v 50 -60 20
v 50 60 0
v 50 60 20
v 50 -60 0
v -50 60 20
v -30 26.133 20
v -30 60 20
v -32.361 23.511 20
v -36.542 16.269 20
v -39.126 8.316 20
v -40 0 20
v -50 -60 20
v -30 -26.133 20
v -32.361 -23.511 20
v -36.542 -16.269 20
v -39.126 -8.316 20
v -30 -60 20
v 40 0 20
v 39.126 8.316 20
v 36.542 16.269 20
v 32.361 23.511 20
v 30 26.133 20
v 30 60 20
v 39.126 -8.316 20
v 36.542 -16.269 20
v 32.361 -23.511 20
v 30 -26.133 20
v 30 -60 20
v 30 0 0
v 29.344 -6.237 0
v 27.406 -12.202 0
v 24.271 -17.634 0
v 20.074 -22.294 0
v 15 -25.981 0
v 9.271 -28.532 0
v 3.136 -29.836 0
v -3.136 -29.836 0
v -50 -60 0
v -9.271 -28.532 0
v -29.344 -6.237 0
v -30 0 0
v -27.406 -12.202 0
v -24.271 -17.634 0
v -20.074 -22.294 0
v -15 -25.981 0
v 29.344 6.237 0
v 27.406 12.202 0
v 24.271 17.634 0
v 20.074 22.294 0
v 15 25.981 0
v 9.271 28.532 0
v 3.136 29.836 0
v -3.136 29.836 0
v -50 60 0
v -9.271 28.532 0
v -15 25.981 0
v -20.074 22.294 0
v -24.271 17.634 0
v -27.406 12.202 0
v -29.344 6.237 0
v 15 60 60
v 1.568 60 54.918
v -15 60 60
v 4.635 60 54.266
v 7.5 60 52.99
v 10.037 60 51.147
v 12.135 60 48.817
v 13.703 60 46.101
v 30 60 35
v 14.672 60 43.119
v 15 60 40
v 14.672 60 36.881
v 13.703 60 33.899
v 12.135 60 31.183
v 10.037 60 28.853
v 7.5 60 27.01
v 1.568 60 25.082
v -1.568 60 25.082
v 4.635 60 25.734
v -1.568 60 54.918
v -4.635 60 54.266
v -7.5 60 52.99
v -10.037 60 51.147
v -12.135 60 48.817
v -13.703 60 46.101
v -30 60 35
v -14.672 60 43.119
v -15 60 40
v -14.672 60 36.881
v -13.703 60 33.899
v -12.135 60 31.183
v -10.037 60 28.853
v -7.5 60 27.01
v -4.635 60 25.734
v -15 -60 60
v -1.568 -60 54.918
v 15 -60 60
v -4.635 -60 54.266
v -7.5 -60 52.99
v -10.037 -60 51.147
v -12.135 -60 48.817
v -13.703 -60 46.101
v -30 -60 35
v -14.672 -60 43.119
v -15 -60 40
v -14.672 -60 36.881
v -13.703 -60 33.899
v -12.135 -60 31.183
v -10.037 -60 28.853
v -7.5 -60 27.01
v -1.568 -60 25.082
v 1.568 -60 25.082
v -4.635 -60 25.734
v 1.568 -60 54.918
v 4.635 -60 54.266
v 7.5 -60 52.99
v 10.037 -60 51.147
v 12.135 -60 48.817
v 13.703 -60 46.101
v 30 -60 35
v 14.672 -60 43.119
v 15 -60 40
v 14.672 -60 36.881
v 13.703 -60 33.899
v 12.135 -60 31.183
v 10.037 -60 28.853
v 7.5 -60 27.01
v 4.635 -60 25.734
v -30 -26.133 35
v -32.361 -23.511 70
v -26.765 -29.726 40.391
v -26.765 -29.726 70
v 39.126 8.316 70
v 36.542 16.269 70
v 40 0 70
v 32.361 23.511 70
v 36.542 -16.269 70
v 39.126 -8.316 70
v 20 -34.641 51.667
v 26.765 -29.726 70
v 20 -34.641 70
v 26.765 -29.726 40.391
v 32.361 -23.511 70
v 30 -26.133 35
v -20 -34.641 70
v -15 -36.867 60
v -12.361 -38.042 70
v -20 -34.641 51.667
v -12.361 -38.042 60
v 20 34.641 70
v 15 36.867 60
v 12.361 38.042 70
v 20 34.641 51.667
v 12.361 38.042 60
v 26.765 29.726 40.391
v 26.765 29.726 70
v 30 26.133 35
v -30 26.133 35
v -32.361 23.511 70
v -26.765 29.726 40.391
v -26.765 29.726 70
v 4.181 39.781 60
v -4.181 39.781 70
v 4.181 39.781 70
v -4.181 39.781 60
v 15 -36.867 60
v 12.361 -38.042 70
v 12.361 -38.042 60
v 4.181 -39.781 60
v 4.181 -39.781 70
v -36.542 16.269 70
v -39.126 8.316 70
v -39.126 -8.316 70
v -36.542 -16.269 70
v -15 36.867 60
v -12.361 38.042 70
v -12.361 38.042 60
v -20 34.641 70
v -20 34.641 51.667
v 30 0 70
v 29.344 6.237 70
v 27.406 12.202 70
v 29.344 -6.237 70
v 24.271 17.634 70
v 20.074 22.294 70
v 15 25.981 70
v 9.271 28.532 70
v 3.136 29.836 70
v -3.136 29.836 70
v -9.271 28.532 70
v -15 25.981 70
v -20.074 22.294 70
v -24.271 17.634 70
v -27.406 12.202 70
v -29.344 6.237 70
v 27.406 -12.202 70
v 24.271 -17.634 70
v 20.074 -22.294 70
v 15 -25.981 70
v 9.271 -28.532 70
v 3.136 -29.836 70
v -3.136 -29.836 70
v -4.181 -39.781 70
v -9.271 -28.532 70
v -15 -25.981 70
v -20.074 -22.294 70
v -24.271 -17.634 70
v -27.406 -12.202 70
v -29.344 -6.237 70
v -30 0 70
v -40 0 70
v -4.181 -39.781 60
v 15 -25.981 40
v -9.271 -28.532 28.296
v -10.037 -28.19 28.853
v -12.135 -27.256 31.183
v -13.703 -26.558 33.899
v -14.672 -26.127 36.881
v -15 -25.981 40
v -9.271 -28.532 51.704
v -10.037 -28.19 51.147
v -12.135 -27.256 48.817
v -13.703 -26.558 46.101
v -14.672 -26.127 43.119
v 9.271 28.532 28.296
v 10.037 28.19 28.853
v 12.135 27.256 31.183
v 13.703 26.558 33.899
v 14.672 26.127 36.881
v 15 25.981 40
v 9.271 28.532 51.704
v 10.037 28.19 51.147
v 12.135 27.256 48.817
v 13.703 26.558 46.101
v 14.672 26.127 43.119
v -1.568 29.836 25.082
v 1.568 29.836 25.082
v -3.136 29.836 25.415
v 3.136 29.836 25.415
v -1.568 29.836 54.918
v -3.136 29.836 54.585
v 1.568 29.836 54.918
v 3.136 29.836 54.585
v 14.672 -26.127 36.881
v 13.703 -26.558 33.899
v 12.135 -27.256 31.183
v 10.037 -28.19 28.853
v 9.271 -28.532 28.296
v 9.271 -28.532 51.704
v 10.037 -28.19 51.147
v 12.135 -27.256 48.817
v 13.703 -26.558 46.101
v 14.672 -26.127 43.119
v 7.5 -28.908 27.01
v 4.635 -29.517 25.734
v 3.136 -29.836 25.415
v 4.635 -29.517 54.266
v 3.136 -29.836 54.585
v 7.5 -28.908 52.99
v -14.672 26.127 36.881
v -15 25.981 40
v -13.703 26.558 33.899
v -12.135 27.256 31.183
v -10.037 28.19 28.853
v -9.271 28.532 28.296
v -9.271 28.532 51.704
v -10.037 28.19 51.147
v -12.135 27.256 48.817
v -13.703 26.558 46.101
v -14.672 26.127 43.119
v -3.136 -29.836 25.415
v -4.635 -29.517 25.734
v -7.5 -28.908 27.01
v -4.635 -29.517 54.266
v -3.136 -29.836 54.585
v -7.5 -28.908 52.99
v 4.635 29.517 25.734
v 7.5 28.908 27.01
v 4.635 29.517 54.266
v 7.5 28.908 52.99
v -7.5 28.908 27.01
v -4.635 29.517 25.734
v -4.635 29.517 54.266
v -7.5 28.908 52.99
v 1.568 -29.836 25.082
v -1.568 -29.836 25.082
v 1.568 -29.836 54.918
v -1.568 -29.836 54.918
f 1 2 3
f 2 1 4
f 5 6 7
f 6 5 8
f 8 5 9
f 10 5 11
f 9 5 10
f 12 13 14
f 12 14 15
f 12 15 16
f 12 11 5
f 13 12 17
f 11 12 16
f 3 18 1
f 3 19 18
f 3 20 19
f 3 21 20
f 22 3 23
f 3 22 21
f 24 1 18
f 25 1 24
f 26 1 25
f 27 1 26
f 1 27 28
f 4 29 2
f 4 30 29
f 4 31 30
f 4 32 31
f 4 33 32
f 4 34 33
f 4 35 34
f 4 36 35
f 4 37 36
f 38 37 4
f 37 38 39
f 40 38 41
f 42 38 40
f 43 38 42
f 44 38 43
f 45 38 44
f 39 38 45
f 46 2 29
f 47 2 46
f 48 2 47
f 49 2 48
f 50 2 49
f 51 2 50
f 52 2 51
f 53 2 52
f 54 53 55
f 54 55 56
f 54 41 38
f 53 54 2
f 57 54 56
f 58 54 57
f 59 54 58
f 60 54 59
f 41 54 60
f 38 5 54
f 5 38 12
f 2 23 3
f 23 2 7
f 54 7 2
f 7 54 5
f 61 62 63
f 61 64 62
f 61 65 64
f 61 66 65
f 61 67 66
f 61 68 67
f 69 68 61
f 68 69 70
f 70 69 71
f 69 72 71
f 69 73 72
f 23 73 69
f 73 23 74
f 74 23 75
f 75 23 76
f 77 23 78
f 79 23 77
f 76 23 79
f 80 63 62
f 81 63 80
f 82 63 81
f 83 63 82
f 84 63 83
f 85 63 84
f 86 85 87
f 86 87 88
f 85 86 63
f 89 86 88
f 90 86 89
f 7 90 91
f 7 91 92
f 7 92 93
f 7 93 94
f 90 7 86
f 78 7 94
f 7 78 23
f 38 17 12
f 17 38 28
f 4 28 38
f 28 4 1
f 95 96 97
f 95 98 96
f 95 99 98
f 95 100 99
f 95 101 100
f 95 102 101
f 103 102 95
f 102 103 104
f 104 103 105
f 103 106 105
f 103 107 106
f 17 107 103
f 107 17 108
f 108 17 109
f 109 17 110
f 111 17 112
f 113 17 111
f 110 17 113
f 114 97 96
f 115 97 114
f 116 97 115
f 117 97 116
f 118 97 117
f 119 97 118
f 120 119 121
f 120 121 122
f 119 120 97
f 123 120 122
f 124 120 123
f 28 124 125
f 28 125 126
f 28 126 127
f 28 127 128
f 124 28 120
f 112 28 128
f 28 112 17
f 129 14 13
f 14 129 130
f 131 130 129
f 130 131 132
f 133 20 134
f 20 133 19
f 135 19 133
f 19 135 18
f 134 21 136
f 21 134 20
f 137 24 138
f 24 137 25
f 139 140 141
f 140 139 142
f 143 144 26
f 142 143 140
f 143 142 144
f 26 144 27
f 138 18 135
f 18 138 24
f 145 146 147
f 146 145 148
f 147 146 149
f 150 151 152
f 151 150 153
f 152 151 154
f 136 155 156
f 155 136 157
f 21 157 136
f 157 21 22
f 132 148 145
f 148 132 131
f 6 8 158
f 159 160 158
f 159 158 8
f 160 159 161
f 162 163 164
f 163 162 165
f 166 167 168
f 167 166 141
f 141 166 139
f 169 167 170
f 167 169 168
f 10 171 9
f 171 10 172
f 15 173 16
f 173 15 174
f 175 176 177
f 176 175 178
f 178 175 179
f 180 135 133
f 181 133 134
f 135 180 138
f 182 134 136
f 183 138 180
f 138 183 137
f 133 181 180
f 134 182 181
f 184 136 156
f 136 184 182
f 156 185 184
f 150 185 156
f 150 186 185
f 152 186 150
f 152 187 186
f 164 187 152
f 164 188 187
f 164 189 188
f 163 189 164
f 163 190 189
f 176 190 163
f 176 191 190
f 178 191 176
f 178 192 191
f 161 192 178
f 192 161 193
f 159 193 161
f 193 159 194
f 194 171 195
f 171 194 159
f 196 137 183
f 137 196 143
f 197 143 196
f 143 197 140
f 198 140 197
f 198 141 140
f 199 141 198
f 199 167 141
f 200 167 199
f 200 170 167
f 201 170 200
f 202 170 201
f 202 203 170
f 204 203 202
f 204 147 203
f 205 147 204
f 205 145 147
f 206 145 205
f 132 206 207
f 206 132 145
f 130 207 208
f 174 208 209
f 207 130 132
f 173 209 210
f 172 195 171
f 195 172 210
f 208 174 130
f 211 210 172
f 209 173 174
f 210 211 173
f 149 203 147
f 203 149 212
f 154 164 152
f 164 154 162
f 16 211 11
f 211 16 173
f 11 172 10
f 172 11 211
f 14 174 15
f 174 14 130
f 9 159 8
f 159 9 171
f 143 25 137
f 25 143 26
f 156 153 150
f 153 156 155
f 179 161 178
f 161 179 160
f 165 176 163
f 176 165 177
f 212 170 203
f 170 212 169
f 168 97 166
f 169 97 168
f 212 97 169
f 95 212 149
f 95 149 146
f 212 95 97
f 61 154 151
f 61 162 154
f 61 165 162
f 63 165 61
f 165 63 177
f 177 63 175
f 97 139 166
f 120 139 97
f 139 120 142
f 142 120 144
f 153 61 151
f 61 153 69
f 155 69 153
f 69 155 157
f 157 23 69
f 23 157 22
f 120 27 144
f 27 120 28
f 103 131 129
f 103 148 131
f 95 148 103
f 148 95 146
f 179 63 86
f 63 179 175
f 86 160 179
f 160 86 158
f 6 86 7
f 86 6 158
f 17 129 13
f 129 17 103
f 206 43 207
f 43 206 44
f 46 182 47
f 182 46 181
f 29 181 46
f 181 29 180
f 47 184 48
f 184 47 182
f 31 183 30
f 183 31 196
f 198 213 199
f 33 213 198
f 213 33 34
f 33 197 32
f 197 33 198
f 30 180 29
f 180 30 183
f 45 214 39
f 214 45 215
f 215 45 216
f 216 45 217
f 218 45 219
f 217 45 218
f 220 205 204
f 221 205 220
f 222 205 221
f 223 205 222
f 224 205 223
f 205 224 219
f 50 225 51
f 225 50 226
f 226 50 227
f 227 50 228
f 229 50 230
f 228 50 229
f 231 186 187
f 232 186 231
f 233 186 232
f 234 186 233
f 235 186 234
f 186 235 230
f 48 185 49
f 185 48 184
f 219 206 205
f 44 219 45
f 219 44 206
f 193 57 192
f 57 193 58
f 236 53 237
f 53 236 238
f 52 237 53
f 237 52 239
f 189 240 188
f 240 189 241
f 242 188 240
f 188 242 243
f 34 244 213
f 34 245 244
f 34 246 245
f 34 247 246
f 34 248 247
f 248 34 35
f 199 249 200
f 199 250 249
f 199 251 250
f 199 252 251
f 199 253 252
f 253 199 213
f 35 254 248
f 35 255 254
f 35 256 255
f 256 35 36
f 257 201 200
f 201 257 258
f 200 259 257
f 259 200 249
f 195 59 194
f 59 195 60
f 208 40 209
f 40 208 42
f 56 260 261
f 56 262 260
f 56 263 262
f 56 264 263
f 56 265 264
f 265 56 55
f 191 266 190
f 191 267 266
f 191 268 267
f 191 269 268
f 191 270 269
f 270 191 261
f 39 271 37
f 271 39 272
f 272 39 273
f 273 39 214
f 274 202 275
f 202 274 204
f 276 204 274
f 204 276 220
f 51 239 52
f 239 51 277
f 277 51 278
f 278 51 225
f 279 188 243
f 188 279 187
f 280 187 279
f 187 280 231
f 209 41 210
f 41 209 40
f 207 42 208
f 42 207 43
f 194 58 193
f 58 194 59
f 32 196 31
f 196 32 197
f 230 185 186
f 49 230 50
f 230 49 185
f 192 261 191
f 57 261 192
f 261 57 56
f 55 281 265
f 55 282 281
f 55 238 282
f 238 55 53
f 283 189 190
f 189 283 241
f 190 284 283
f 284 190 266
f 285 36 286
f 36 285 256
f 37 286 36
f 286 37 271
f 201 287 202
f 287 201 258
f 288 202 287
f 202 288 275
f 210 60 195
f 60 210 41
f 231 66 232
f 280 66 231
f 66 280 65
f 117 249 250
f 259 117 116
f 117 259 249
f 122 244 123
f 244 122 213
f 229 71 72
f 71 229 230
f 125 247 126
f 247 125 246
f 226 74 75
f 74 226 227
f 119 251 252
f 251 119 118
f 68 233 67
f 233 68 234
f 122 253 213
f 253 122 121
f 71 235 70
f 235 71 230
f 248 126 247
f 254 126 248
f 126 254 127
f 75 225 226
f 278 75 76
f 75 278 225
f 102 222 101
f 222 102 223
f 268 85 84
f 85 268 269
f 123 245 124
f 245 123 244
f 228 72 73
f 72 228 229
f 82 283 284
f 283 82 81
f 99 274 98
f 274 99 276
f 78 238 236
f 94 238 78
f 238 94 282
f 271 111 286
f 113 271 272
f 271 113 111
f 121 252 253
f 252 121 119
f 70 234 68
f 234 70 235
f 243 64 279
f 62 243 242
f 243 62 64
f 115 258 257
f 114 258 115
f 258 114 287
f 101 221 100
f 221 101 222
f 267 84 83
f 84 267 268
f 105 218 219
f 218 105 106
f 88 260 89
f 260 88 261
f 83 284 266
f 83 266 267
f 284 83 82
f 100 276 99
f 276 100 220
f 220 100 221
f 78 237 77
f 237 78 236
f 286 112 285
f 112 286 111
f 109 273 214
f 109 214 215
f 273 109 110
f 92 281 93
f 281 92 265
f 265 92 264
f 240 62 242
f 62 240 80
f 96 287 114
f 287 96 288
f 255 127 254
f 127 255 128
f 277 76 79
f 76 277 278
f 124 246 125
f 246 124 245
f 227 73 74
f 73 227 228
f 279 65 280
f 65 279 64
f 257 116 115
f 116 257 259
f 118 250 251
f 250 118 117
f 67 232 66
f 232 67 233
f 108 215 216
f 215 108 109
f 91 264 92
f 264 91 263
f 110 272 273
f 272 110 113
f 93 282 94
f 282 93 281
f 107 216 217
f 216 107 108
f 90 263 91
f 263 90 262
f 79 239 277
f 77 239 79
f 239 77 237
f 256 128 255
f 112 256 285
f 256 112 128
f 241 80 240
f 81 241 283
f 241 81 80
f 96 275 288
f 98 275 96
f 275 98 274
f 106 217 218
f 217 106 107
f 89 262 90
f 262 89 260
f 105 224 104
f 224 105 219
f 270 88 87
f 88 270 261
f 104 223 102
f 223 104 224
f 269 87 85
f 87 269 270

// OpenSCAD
union(){
difference(){
difference(){
union(){
 translate([-50,-60,0]) cube([100,120,20]);
 translate([0,0,20])cylinder(h=50,r=40);
 hull(){
  translate([-30,-60,20]) cube([60,120,15]);
  translate([-15,-60,35]) cube([30,120,25]);
  }
}
translate([0,0,-2]) cylinder(h=90,r=30);
}
 translate([0,70,40]) rotate([90,0,0]) cylinder(h=140,r=15);
}
}
